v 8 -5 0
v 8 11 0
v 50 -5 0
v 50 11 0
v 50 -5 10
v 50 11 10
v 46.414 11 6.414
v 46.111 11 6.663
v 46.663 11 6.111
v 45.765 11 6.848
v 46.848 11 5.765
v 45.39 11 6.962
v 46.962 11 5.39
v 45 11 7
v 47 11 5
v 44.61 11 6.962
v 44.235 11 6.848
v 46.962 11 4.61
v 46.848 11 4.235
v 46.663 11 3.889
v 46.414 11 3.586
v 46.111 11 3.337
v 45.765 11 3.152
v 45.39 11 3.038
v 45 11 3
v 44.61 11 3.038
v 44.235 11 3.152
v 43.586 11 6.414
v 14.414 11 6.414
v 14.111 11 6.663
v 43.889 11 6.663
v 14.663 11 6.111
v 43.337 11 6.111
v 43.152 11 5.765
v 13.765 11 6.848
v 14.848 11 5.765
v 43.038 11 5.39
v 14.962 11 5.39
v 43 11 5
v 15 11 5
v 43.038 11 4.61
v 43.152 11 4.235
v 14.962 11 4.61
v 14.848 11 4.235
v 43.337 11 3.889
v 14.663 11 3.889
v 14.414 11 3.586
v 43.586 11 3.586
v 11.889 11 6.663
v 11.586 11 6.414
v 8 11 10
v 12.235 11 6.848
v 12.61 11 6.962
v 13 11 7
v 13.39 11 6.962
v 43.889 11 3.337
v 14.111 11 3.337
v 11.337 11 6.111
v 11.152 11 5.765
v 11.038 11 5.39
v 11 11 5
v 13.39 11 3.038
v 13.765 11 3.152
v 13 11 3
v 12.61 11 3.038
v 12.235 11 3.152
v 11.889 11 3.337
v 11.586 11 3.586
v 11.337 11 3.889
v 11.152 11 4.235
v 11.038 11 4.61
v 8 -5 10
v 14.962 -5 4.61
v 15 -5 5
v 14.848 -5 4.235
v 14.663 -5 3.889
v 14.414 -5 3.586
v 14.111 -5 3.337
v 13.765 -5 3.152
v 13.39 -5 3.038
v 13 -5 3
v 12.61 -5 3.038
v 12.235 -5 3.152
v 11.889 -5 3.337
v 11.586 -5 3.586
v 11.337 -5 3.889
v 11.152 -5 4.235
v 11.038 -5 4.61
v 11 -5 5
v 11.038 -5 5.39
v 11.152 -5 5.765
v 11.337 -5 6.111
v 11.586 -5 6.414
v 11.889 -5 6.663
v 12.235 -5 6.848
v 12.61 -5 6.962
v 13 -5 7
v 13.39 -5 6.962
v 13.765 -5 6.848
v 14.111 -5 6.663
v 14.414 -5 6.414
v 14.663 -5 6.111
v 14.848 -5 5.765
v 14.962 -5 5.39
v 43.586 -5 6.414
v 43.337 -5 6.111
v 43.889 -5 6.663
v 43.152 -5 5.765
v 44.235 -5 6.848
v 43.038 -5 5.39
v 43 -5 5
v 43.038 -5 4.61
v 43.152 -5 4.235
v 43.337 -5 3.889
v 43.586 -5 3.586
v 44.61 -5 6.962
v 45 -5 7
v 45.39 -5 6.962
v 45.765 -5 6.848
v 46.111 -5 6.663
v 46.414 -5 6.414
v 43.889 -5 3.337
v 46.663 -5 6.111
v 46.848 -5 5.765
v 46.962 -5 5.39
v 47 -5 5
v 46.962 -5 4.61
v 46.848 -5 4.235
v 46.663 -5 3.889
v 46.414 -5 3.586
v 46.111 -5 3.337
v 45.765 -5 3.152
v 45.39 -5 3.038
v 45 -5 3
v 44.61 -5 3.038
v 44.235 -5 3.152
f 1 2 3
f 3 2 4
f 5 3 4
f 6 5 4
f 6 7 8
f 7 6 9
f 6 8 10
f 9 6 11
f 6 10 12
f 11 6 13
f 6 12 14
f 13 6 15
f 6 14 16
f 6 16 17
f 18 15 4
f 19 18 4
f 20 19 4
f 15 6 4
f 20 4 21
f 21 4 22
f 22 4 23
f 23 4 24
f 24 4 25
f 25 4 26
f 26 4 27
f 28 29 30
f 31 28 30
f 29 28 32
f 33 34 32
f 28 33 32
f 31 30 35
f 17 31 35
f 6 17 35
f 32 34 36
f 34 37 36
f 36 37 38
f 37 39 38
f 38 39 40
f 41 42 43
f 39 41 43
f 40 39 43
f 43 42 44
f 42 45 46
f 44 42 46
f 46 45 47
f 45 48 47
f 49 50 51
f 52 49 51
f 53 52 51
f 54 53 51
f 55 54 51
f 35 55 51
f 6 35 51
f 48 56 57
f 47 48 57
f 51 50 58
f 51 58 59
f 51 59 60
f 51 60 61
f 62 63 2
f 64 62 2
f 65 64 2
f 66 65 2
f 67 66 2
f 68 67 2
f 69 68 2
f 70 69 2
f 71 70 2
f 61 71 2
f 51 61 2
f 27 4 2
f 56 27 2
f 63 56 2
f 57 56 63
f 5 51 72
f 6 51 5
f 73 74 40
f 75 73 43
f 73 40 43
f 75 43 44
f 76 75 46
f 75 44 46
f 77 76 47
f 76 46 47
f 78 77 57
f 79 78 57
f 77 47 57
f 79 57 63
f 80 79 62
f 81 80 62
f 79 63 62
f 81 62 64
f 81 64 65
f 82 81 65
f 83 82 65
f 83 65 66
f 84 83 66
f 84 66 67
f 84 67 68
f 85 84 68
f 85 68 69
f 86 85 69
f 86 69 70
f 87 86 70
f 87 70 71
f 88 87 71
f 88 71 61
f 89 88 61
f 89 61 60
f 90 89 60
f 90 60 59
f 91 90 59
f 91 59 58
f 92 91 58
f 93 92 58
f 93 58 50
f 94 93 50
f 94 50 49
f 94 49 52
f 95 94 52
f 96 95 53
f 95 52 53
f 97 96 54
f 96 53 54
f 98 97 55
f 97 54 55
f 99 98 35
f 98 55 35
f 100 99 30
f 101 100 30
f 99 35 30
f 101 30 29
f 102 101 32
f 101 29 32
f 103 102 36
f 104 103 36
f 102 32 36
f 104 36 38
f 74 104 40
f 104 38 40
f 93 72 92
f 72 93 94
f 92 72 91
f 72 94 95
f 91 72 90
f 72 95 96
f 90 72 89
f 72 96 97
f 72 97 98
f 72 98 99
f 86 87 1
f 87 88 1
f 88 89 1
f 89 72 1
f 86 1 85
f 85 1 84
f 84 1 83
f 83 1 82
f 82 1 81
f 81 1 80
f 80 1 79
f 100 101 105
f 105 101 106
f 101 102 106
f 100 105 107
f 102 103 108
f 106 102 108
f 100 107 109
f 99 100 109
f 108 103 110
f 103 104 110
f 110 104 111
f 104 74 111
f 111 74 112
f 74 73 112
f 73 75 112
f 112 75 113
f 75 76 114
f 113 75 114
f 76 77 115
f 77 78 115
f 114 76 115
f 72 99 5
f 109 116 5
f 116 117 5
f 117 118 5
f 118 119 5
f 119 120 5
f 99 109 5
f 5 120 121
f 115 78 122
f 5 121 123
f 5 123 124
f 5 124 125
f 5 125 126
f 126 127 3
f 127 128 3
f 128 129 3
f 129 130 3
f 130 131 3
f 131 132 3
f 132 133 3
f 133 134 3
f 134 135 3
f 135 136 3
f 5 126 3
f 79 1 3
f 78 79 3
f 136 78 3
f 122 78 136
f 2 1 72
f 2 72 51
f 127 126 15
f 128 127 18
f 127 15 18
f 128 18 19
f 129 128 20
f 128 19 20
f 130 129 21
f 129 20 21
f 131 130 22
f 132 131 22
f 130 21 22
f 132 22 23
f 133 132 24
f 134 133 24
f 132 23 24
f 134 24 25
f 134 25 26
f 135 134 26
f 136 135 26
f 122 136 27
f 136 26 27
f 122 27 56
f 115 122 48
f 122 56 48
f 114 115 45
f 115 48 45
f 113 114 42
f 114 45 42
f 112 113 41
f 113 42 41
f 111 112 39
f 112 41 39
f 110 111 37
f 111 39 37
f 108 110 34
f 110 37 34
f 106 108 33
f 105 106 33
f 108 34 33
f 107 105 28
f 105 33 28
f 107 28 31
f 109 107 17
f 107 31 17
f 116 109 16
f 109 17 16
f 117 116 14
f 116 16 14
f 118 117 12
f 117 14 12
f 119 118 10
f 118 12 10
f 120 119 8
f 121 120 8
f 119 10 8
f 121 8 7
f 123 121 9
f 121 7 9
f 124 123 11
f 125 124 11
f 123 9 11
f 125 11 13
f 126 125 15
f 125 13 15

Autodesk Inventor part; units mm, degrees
ref_plane "YZ Plane" through (0, 0, 0) normal (1, 0, 0) x (0, 1, 0)
ref_plane "XZ Plane" through (0, 0, 0) normal (0, 1, 0) x (-1, 0, 0)
ref_plane "XY Plane" through (0, 0, 0) normal (0, 0, 1) x (1, 0, 0)
sketch "Sketch1" plane through (0, 0, 0) normal (0, 0, 1) x (1, 0, 0)
  line L0 (50, -5) -> (50, 11)
  line L1 (50, 11) -> (8, 11)
  line L2 (8, -5) -> (8, 11)
  line L3 (8, -5) -> (50, -5)
  dimension "d1" = 16
  dimension "d47" = 42
extrude "Extrusion3" add sketch "Sketch1" along normal blind 10
sketch "Sketch6" plane through (8, 11, 0) normal (0, 1, 0) x (1, 0, 0)
  circle A0 centre (5, -5) radius 2
  circle A1 centre (37, -5) radius 2
  line L0 (42, 0) -> (0, 0) projected
  line L1 (42, 0) -> (42, -10) projected
  line L2 (0, 0) -> (0, -10) projected
  dimension "d48" = 4
  dimension "d49" = 4
  dimension "d50" = 5
  dimension "d51" = 5
  dimension "d52" = 5
  dimension "d53" = 5
extrude "Extrusion7" cut sketch "Sketch6" against normal blind 50
properties part number "Espaciador Sub Inferior" material "Aluminum 6061"
